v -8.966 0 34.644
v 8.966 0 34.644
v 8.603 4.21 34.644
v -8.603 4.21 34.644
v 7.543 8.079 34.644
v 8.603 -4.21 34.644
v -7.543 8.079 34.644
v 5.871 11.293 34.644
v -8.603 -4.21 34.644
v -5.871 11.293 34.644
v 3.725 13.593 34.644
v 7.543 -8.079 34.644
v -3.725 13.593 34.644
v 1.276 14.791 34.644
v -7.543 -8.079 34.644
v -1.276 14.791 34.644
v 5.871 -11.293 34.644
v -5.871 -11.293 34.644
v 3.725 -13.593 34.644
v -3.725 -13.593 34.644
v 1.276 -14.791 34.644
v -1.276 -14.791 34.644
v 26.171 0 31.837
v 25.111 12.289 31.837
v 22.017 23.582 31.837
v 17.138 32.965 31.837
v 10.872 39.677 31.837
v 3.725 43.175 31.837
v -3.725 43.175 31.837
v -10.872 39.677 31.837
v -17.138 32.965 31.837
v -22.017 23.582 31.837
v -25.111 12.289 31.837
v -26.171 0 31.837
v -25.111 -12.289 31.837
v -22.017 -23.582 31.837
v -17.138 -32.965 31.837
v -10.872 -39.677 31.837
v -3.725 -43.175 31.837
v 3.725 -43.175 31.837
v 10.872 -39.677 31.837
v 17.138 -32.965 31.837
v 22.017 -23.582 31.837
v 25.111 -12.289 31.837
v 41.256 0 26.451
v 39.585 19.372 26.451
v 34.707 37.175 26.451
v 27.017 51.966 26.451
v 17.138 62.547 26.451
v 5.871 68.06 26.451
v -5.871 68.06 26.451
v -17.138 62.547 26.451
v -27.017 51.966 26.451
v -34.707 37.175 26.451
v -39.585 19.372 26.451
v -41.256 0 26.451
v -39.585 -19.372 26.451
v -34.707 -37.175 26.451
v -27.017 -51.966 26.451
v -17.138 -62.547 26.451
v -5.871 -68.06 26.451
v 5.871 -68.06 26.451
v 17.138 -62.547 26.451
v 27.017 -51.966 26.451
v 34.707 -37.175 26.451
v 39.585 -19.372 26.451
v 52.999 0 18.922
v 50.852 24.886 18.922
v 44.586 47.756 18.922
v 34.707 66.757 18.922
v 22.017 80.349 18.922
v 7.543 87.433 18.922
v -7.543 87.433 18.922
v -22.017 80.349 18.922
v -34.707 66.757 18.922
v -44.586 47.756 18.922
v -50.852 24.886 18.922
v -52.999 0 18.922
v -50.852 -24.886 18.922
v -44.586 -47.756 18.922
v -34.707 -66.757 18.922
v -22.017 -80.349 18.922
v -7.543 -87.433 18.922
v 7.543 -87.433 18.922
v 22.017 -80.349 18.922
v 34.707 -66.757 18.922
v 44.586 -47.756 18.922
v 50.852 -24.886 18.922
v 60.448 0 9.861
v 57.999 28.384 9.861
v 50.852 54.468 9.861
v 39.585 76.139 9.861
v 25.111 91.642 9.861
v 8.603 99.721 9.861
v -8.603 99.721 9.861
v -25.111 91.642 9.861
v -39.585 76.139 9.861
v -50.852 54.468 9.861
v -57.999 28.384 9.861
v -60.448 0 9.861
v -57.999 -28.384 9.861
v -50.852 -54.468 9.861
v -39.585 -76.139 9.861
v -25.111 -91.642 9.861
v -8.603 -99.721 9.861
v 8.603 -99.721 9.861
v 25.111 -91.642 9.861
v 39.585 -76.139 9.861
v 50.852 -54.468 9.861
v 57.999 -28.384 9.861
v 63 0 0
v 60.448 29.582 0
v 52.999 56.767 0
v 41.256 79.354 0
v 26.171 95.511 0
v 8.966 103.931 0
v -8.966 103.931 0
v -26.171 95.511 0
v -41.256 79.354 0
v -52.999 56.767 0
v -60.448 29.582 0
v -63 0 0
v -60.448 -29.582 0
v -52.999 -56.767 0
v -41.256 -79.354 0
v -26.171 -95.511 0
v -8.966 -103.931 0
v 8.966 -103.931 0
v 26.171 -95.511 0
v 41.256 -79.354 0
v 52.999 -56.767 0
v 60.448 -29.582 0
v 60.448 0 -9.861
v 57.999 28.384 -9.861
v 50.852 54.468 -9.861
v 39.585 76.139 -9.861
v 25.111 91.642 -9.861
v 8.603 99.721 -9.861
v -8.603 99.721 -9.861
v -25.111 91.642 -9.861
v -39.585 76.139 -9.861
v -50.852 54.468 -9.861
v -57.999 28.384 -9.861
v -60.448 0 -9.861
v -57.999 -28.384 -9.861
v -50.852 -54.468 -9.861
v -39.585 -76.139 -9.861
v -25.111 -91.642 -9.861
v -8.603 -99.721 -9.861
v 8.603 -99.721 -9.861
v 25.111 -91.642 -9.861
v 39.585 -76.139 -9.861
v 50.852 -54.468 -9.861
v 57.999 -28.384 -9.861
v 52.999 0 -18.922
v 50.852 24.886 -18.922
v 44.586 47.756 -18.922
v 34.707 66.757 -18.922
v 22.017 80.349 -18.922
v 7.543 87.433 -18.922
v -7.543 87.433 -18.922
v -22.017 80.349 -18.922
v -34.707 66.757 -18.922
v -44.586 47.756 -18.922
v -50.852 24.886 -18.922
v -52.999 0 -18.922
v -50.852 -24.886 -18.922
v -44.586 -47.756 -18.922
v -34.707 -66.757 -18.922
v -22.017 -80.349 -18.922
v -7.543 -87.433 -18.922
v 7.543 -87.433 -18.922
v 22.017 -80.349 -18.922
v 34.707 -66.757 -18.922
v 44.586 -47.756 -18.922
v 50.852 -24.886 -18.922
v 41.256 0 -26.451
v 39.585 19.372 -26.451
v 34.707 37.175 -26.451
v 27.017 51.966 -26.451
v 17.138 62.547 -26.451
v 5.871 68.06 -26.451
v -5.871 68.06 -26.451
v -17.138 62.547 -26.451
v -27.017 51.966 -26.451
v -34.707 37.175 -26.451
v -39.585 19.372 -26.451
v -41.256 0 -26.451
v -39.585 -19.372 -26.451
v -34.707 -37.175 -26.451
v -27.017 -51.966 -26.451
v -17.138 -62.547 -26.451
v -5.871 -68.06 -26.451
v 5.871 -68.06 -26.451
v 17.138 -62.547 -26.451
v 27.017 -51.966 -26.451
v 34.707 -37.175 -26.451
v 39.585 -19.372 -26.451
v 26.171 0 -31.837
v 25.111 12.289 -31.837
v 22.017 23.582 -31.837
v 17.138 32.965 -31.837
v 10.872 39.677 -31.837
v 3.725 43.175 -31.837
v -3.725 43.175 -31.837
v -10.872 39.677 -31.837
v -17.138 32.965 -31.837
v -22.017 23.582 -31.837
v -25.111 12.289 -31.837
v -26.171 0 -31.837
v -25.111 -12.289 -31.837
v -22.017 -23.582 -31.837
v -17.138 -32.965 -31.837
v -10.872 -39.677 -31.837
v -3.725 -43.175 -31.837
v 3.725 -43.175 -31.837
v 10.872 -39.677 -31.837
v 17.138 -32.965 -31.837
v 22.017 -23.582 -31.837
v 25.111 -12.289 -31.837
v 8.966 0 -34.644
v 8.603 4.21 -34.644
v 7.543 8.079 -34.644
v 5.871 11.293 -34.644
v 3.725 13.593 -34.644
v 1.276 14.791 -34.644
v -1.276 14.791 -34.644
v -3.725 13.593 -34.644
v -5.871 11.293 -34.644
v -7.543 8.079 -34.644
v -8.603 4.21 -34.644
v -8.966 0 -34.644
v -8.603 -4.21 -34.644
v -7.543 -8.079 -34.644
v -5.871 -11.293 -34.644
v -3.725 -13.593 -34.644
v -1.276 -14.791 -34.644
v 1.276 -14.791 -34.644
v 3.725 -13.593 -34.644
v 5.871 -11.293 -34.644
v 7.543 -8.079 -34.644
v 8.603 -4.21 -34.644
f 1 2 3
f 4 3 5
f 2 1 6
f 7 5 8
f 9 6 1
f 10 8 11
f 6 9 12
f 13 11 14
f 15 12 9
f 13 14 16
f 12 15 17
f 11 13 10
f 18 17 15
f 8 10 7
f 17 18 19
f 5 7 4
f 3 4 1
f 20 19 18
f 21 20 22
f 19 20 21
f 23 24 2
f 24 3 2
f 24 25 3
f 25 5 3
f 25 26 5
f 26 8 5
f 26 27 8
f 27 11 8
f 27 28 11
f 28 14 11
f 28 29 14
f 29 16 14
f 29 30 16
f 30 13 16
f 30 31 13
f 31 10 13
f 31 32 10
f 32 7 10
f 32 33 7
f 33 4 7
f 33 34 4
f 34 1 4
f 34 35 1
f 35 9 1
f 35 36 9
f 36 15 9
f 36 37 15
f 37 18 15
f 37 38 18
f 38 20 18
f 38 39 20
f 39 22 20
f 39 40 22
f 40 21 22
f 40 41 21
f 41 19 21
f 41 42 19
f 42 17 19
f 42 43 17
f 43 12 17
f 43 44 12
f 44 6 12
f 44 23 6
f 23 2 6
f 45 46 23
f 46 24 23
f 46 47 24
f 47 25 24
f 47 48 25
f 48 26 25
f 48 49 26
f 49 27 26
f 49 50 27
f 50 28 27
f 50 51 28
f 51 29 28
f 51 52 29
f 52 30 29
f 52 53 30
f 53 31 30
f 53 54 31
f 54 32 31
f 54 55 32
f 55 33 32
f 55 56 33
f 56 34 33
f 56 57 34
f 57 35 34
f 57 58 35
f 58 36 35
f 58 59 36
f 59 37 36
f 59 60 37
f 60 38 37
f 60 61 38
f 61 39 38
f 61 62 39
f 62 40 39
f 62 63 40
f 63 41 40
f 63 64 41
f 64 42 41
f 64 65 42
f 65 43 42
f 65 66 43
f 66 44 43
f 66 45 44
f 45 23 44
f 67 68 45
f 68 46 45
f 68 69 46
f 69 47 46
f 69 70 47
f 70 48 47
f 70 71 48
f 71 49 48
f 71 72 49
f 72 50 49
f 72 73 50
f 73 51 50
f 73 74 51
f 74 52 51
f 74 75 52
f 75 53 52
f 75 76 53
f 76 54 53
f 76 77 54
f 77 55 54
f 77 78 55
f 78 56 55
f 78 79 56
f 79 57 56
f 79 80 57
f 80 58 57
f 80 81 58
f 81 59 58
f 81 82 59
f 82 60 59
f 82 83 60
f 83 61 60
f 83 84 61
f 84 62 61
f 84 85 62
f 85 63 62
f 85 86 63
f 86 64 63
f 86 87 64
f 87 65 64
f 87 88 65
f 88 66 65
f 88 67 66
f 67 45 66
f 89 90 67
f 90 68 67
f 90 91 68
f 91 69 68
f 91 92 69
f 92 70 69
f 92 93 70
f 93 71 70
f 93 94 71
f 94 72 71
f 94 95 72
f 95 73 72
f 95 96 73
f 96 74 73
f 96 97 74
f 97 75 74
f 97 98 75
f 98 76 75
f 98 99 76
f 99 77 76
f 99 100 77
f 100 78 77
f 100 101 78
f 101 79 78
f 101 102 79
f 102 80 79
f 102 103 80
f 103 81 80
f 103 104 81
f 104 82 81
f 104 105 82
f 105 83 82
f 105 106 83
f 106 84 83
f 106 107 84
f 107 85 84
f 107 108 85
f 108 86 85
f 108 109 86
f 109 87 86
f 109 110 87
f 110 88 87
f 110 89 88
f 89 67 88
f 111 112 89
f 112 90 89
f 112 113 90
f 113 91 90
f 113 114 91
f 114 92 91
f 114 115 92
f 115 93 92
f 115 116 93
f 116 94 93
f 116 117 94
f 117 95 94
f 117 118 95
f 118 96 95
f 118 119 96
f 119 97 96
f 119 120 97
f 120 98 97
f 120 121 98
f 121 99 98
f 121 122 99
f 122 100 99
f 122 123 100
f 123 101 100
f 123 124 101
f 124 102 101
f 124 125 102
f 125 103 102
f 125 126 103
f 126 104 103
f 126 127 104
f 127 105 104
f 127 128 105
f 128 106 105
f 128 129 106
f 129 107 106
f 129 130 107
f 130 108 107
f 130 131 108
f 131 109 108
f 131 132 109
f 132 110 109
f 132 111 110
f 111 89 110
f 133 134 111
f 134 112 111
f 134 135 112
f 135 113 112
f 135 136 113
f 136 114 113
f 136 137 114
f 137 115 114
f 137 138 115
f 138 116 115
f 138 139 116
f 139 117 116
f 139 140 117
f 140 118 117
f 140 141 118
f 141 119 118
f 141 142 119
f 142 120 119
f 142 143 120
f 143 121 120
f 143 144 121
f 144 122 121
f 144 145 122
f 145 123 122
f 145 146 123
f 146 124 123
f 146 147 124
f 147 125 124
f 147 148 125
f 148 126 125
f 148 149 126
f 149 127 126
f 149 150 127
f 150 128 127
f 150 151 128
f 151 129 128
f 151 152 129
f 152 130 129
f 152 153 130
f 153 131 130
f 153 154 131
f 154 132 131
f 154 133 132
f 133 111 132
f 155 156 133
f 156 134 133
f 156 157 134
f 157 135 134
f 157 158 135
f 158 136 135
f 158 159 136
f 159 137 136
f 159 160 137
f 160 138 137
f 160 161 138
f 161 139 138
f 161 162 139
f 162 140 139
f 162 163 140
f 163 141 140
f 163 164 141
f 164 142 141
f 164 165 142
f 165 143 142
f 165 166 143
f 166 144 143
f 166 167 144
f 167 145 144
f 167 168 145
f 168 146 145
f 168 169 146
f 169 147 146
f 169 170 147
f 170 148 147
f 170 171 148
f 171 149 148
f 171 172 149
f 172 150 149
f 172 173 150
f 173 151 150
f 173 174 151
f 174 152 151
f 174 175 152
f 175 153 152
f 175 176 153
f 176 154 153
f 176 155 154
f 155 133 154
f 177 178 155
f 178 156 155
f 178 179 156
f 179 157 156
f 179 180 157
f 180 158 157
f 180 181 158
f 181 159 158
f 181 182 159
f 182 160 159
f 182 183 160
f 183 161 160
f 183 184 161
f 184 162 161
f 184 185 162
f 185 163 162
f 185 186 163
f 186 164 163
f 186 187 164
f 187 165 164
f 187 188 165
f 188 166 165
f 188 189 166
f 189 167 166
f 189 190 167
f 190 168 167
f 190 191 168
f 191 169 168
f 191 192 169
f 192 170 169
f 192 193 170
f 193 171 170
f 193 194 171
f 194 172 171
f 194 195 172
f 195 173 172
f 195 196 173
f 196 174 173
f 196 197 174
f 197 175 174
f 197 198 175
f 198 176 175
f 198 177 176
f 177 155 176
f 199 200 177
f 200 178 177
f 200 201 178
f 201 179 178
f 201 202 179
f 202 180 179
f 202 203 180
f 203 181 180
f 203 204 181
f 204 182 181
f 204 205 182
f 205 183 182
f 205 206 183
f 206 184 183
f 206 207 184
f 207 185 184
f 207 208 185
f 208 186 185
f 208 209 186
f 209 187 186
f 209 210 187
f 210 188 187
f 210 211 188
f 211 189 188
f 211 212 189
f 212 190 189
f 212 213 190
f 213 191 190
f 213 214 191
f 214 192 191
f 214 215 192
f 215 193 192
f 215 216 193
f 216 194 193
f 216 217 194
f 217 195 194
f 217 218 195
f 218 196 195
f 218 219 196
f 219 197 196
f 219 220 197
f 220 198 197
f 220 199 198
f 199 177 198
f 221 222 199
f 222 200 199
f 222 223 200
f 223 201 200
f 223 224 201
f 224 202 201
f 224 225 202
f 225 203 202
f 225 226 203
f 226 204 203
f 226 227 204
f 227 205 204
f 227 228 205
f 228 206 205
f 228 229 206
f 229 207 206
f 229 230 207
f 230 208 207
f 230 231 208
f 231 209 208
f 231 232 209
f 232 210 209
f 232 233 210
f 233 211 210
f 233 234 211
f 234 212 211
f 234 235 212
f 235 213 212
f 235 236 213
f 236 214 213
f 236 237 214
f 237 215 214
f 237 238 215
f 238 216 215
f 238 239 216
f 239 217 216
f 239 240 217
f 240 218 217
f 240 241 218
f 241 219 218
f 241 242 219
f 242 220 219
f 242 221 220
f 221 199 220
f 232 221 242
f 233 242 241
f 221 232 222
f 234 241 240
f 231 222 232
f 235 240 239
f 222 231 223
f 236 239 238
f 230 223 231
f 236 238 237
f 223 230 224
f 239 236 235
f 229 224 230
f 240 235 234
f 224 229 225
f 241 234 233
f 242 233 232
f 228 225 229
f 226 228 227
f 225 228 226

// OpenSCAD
// Generated by SolidPython 1.0.1 on 2020-07-29 00:46:49


scale(v = [9, 15, 5]) {
	sphere(r = 7);
}
/***********************************************
*********      SolidPython code:      **********
************************************************
 
# import packages: SolidPython
from solid import *
from solid.utils import *
from itertools import chain, combinations, permutations


class Resize:

    def __init__(self, scad_file):
        self.scad_file = scad_file
        #self.scad_file = import_scad(scad_file)
        # cone/cylinder param:
        self.r1 = 0
        self.r2 = 0
        self.h = 0
        # rectangular prism param:
        self.w = 0
        self.l = 0
        # ellipse param:
        self.r = 0

    # import OpenScad code (file name corresponds to shape)


    # classify shape + parameters
    def assign(self, param1, param2, param3):
        if self.scad_file == 'cone.scad':
            self.r1 = param1
            self.r2 = param2
            self.h = param3
        elif self.scad_file == 'cylinder.scad':
            self.r1 = param1
            self.r2 = param2
            self.h = param3
        elif self.scad_file == 'rectangularPrism.scad':
            self.h = param1
            self.l = param2
            self.w = param3
        else:
            self.r = param1
            self.h = param2

    # resize parameters
    def iterate(self):
        x = range(3, 20, 2)
        i = 1
        if self.scad_file == 'cone.scad':
            tempList = list(permutations(x, 2))
            for temp in tempList:
                param1 = temp[0]
                param2 = temp[1]
                filepath = 'produced_scad_files/' + 'cone' + str(param1) + '_' + str(param2) + '_' + '.scad'
                scad_render_to_file(cylinder(h=param1, r1=param2, r2=0), filepath)

        elif self.scad_file == 'cylinder.scad':
            tempList = list(permutations(x, 3))
            for temp in tempList:
                param1 = temp[0]
                param2 = temp[1]
                filepath = 'produced_scad_files/' + 'cylinder' + str(param1) + '_' + str(param2) + '_' + '.scad'
                scad_render_to_file(cylinder(h=param1, r1=param2, r2=param2), filepath)

        elif self.scad_file == 'rectangularPrism.scad':
            tempList = list(permutations(x, 3))
            for temp in tempList:
                param1 = temp[0]
                param2 = temp[1]
                param3 = temp[2]
                filepath = 'produced_scad_files/' + 'rectangularPrism' + str(param1) + '_' + str(param2) + '_' + str(
                    param3) + '.scad'
                scad_render_to_file(cube(size=(param1, param2, param3)), filepath)

        elif self.scad_file == 'ellipse.scad':
            tempList = list(permutations(x, 4))
            for temp in tempList:
                param1 = temp[0]
                param2 = temp[1]
                param3 = temp[2]
                param4 = temp[3]
                filepath = 'produced_scad_files/' + 'ellipse' + str(param1) + '_' + str(param2) + '_' + str(param3) + '_' + str(param4) + '.scad'
                scad_render_to_file(scale([param1, param2, param3])(sphere(r=param4)), filepath)

    def render_to_scadfile(self):
        scad_render_to_file(scad, 'example.scad') 
 
************************************************/
